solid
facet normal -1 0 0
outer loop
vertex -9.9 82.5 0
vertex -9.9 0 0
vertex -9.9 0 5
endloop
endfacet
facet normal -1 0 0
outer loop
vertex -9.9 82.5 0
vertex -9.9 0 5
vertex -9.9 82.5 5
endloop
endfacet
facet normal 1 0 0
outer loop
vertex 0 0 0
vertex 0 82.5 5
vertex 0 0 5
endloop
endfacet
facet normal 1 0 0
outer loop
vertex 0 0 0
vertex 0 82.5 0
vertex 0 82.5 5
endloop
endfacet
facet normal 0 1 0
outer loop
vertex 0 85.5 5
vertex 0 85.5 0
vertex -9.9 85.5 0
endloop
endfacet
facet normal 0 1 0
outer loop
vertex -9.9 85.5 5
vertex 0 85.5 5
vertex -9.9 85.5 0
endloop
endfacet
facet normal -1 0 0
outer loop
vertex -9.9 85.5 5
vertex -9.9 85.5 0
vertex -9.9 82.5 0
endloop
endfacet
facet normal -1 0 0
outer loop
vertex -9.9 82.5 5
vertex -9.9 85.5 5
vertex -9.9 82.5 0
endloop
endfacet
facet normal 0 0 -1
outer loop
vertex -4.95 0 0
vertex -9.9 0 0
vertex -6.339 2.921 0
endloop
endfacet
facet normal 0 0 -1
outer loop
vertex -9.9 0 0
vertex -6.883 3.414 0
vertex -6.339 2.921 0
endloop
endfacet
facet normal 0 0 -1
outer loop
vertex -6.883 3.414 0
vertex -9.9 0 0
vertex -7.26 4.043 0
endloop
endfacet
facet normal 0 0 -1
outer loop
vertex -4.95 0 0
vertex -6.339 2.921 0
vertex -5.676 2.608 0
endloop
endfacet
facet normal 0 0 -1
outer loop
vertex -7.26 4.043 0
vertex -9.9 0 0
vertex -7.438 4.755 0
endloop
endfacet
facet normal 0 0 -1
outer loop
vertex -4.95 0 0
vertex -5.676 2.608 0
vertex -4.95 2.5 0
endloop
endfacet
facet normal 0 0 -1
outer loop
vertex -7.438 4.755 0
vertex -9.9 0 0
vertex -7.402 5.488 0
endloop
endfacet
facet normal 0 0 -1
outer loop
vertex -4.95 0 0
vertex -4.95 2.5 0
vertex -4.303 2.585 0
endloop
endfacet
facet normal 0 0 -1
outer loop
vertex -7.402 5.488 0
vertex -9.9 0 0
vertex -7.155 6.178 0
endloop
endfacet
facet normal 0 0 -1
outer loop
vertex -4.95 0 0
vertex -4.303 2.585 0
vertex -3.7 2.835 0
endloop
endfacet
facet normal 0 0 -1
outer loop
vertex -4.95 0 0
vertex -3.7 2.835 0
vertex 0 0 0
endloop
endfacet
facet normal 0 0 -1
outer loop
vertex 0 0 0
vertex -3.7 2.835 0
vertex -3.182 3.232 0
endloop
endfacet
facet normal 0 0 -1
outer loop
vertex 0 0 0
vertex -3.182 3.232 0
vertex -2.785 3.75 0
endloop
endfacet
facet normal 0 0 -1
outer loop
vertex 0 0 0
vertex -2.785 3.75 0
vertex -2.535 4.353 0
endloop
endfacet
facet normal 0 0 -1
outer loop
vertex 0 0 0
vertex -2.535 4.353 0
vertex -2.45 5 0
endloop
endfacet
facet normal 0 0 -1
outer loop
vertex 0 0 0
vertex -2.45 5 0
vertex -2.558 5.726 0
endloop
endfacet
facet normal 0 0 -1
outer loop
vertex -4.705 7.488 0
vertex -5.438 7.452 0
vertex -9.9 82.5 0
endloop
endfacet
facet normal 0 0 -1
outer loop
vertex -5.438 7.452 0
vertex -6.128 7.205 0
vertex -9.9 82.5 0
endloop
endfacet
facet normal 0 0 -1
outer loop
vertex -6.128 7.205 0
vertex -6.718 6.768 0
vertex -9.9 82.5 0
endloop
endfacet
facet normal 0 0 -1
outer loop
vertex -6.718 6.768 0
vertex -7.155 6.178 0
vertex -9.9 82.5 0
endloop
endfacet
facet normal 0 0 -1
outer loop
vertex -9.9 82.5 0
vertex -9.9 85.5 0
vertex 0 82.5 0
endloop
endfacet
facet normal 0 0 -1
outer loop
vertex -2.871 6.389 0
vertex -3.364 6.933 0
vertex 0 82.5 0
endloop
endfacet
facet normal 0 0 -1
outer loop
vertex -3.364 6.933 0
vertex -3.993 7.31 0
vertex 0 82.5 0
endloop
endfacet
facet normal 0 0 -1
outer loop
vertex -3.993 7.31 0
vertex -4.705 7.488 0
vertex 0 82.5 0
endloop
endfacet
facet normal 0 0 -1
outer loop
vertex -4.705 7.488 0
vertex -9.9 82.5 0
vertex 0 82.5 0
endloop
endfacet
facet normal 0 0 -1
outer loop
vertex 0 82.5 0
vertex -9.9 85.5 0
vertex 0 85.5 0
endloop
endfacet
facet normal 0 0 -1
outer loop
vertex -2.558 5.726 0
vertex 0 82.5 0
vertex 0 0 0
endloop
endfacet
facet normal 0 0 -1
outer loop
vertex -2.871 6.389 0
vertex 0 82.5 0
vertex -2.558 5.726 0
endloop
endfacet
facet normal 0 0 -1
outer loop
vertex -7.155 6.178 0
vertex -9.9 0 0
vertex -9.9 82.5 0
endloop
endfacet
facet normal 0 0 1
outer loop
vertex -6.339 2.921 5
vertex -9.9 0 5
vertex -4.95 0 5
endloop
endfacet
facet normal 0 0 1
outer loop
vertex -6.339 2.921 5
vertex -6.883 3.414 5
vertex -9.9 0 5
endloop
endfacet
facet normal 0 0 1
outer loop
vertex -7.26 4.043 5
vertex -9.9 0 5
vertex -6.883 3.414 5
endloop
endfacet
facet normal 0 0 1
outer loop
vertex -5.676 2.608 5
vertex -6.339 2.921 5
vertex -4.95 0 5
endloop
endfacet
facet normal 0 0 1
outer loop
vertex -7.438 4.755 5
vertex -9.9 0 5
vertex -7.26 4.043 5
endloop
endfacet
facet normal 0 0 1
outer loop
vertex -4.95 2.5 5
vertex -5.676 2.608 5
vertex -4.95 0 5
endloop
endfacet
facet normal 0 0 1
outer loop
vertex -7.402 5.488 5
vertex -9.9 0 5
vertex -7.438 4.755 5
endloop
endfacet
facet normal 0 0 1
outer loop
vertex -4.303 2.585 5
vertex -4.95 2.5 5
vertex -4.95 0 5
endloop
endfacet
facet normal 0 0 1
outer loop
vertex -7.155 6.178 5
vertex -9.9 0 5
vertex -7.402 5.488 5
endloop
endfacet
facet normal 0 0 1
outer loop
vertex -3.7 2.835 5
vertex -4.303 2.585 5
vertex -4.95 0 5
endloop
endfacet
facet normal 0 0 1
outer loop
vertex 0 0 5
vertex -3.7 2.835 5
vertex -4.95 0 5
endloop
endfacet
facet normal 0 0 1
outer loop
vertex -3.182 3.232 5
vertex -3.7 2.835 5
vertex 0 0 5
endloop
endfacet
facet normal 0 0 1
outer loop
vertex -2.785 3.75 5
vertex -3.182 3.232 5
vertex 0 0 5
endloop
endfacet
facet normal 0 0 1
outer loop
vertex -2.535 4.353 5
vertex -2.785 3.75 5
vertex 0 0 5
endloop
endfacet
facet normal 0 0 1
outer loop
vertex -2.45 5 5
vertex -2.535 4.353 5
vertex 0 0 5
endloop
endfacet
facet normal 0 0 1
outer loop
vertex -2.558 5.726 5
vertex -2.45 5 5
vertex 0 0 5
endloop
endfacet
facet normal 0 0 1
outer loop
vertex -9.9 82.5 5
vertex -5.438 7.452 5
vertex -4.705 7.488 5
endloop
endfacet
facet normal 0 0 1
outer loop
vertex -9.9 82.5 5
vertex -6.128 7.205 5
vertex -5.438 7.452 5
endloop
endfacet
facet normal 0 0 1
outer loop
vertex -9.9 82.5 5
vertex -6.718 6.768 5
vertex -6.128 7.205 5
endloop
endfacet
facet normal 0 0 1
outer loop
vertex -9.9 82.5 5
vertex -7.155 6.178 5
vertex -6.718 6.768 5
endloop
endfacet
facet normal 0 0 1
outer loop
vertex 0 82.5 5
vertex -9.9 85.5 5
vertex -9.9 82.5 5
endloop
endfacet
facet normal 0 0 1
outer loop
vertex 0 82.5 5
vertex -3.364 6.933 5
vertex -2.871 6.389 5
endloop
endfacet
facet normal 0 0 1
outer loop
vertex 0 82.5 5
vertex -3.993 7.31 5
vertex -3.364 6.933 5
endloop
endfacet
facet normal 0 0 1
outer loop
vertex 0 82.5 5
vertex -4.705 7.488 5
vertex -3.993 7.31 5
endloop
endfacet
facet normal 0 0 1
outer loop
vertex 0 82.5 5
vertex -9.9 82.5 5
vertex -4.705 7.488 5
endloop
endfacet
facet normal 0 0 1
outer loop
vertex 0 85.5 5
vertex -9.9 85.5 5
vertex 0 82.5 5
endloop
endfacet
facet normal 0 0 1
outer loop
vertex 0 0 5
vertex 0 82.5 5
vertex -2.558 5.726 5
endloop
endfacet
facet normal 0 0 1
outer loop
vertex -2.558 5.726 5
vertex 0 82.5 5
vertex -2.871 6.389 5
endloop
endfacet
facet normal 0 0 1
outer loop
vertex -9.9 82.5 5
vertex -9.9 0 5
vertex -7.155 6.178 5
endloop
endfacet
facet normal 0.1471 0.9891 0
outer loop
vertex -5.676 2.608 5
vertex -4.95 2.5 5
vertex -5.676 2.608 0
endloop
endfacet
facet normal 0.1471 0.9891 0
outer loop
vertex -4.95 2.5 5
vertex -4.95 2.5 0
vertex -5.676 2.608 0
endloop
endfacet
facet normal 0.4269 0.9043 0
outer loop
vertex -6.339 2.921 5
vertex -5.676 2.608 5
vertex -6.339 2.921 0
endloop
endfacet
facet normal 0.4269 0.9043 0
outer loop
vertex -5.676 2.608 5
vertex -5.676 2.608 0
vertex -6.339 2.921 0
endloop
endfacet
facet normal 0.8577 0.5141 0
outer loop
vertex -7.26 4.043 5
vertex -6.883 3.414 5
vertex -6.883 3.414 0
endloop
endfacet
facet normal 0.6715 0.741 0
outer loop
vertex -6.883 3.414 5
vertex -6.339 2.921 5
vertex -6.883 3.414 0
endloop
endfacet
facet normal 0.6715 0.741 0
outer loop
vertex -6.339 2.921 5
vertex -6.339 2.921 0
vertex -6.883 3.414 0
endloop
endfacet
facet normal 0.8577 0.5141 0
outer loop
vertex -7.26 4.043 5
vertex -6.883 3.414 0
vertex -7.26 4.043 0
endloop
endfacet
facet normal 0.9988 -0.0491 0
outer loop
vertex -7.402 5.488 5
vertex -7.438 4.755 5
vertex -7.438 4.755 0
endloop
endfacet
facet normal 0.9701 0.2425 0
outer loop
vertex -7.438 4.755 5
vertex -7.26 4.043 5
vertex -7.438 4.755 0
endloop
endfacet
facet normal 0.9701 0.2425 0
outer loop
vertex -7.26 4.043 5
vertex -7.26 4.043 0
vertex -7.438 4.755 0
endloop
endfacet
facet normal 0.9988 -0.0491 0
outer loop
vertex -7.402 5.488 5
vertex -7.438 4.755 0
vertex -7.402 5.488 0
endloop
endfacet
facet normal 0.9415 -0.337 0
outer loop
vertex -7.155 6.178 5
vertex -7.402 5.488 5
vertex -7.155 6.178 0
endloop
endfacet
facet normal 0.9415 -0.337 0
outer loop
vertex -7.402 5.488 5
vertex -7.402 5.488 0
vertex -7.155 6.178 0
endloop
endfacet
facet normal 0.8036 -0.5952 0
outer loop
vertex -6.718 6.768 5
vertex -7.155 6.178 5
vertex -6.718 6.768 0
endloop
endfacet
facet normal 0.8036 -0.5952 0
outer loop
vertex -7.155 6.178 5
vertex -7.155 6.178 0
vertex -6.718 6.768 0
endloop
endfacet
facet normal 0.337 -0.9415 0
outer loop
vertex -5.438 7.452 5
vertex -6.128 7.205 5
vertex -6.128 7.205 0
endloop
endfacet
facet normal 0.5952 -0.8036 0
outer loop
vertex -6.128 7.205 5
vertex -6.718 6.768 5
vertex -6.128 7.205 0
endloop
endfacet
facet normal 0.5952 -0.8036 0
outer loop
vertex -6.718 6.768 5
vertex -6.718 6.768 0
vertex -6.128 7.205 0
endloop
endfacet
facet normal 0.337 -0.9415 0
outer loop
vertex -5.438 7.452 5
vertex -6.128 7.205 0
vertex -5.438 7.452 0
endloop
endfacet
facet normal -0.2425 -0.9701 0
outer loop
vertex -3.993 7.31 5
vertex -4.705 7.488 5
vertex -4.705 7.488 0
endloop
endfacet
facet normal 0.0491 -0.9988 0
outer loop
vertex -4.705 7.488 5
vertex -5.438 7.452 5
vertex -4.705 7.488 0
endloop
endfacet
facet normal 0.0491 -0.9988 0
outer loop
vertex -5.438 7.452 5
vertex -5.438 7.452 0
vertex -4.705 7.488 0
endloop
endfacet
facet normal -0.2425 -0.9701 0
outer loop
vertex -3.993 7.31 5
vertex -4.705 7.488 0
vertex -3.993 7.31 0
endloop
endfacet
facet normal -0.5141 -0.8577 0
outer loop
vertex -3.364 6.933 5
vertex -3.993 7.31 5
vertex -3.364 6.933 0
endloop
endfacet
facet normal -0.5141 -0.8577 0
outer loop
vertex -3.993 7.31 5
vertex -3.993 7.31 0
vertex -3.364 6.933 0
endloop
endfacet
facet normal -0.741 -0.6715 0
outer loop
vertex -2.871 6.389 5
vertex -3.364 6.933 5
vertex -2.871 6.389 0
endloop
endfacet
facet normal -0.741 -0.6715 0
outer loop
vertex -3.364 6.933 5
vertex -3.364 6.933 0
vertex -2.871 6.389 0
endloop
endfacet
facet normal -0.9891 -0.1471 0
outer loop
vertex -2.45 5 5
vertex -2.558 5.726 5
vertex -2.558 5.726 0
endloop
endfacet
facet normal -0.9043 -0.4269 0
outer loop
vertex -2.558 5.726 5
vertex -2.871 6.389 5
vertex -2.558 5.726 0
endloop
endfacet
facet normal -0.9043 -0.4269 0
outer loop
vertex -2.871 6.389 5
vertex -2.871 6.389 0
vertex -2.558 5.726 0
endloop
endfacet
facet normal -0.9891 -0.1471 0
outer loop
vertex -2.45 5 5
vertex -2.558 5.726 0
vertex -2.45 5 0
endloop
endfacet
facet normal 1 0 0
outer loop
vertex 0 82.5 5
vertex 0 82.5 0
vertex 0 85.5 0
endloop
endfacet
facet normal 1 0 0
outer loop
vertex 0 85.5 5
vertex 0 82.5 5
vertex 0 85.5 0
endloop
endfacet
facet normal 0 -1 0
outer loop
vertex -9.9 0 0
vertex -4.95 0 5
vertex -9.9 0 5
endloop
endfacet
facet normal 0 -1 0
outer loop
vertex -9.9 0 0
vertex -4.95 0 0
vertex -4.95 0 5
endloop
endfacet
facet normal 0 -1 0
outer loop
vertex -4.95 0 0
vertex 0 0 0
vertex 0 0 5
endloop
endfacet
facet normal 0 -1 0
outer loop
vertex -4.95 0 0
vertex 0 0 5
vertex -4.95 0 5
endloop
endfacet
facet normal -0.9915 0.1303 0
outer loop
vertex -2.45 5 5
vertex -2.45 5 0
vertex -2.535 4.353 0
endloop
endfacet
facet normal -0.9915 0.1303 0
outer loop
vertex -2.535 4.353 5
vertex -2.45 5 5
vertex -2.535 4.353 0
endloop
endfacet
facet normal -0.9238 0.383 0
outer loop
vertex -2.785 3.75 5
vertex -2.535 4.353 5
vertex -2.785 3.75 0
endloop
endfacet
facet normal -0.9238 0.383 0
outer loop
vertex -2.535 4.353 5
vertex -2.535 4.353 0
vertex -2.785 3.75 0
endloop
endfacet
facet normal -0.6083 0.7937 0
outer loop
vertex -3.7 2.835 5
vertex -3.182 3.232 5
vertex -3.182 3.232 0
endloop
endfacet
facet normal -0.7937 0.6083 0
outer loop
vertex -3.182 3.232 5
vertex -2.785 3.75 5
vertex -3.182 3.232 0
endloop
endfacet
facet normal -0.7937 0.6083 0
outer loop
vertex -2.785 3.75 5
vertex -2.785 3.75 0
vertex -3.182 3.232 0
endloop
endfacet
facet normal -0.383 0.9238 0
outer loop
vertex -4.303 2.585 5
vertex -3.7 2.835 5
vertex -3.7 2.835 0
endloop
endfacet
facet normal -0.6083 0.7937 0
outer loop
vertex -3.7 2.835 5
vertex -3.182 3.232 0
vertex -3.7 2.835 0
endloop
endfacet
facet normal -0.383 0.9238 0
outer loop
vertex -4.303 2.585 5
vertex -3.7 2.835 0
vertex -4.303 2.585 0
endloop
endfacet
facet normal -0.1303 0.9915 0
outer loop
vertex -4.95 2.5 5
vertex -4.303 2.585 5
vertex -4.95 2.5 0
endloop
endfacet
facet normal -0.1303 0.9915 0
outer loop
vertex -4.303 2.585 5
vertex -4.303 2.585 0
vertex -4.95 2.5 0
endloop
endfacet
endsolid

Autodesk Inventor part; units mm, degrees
ref_plane "YZ Plane" through (0, 0, 0) normal (1, 0, 0) x (0, 1, 0)
ref_plane "XZ Plane" through (0, 0, 0) normal (0, 1, 0) x (-1, 0, 0)
ref_plane "XY Plane" through (0, 0, 0) normal (0, 0, 1) x (1, 0, 0)
sketch "Sketch2" plane through (0, 0, 0) normal (0, 0, 1) x (1, 0, 0)
  line L0 (0, 0) -> (-9.9, 0)
  line L1 (-4.95, 0) -> (-4.95, 2.5)
  line L2 (-4.95, 0) -> (-2.45, 0) construction
  circle A0 centre (-4.95, 5) radius 2.5
  line L3 (-4.95, 7.5) -> (32.05, 7.5) construction
  line L4 (0, 0) -> (-9.9, 0)
  line L5 (0, 0) -> (-9.9, 0)
  line L6 (-4.95, 7.5) -> (66.05, 7.5) construction
  line L7 (-4.95, 7.5) -> (70.05, 7.5) construction
  line L8 (0, 0) -> (-9.9, 0)
  line L9 (-9.9, 0) -> (-9.9, 82.5)
  line L10 (0, 82.5) -> (0, 0)
  line L11 (0, 82.5) -> (0, 85.5)
  line L12 (0, 85.5) -> (-9.9, 85.5)
  line L13 (-9.9, 85.5) -> (-9.9, 82.5)
  dimension "d35" = 5
  dimension "d33" = 2.5
  dimension "d34" = 90
  dimension "d48" = 9.9
  dimension "d49" = 9.9
  dimension "d50" = 3
extrude "Extrusion6" add sketch "Sketch2" along normal blind 5
properties part number "Cube_Holder_SB_V1_(71mm)"
